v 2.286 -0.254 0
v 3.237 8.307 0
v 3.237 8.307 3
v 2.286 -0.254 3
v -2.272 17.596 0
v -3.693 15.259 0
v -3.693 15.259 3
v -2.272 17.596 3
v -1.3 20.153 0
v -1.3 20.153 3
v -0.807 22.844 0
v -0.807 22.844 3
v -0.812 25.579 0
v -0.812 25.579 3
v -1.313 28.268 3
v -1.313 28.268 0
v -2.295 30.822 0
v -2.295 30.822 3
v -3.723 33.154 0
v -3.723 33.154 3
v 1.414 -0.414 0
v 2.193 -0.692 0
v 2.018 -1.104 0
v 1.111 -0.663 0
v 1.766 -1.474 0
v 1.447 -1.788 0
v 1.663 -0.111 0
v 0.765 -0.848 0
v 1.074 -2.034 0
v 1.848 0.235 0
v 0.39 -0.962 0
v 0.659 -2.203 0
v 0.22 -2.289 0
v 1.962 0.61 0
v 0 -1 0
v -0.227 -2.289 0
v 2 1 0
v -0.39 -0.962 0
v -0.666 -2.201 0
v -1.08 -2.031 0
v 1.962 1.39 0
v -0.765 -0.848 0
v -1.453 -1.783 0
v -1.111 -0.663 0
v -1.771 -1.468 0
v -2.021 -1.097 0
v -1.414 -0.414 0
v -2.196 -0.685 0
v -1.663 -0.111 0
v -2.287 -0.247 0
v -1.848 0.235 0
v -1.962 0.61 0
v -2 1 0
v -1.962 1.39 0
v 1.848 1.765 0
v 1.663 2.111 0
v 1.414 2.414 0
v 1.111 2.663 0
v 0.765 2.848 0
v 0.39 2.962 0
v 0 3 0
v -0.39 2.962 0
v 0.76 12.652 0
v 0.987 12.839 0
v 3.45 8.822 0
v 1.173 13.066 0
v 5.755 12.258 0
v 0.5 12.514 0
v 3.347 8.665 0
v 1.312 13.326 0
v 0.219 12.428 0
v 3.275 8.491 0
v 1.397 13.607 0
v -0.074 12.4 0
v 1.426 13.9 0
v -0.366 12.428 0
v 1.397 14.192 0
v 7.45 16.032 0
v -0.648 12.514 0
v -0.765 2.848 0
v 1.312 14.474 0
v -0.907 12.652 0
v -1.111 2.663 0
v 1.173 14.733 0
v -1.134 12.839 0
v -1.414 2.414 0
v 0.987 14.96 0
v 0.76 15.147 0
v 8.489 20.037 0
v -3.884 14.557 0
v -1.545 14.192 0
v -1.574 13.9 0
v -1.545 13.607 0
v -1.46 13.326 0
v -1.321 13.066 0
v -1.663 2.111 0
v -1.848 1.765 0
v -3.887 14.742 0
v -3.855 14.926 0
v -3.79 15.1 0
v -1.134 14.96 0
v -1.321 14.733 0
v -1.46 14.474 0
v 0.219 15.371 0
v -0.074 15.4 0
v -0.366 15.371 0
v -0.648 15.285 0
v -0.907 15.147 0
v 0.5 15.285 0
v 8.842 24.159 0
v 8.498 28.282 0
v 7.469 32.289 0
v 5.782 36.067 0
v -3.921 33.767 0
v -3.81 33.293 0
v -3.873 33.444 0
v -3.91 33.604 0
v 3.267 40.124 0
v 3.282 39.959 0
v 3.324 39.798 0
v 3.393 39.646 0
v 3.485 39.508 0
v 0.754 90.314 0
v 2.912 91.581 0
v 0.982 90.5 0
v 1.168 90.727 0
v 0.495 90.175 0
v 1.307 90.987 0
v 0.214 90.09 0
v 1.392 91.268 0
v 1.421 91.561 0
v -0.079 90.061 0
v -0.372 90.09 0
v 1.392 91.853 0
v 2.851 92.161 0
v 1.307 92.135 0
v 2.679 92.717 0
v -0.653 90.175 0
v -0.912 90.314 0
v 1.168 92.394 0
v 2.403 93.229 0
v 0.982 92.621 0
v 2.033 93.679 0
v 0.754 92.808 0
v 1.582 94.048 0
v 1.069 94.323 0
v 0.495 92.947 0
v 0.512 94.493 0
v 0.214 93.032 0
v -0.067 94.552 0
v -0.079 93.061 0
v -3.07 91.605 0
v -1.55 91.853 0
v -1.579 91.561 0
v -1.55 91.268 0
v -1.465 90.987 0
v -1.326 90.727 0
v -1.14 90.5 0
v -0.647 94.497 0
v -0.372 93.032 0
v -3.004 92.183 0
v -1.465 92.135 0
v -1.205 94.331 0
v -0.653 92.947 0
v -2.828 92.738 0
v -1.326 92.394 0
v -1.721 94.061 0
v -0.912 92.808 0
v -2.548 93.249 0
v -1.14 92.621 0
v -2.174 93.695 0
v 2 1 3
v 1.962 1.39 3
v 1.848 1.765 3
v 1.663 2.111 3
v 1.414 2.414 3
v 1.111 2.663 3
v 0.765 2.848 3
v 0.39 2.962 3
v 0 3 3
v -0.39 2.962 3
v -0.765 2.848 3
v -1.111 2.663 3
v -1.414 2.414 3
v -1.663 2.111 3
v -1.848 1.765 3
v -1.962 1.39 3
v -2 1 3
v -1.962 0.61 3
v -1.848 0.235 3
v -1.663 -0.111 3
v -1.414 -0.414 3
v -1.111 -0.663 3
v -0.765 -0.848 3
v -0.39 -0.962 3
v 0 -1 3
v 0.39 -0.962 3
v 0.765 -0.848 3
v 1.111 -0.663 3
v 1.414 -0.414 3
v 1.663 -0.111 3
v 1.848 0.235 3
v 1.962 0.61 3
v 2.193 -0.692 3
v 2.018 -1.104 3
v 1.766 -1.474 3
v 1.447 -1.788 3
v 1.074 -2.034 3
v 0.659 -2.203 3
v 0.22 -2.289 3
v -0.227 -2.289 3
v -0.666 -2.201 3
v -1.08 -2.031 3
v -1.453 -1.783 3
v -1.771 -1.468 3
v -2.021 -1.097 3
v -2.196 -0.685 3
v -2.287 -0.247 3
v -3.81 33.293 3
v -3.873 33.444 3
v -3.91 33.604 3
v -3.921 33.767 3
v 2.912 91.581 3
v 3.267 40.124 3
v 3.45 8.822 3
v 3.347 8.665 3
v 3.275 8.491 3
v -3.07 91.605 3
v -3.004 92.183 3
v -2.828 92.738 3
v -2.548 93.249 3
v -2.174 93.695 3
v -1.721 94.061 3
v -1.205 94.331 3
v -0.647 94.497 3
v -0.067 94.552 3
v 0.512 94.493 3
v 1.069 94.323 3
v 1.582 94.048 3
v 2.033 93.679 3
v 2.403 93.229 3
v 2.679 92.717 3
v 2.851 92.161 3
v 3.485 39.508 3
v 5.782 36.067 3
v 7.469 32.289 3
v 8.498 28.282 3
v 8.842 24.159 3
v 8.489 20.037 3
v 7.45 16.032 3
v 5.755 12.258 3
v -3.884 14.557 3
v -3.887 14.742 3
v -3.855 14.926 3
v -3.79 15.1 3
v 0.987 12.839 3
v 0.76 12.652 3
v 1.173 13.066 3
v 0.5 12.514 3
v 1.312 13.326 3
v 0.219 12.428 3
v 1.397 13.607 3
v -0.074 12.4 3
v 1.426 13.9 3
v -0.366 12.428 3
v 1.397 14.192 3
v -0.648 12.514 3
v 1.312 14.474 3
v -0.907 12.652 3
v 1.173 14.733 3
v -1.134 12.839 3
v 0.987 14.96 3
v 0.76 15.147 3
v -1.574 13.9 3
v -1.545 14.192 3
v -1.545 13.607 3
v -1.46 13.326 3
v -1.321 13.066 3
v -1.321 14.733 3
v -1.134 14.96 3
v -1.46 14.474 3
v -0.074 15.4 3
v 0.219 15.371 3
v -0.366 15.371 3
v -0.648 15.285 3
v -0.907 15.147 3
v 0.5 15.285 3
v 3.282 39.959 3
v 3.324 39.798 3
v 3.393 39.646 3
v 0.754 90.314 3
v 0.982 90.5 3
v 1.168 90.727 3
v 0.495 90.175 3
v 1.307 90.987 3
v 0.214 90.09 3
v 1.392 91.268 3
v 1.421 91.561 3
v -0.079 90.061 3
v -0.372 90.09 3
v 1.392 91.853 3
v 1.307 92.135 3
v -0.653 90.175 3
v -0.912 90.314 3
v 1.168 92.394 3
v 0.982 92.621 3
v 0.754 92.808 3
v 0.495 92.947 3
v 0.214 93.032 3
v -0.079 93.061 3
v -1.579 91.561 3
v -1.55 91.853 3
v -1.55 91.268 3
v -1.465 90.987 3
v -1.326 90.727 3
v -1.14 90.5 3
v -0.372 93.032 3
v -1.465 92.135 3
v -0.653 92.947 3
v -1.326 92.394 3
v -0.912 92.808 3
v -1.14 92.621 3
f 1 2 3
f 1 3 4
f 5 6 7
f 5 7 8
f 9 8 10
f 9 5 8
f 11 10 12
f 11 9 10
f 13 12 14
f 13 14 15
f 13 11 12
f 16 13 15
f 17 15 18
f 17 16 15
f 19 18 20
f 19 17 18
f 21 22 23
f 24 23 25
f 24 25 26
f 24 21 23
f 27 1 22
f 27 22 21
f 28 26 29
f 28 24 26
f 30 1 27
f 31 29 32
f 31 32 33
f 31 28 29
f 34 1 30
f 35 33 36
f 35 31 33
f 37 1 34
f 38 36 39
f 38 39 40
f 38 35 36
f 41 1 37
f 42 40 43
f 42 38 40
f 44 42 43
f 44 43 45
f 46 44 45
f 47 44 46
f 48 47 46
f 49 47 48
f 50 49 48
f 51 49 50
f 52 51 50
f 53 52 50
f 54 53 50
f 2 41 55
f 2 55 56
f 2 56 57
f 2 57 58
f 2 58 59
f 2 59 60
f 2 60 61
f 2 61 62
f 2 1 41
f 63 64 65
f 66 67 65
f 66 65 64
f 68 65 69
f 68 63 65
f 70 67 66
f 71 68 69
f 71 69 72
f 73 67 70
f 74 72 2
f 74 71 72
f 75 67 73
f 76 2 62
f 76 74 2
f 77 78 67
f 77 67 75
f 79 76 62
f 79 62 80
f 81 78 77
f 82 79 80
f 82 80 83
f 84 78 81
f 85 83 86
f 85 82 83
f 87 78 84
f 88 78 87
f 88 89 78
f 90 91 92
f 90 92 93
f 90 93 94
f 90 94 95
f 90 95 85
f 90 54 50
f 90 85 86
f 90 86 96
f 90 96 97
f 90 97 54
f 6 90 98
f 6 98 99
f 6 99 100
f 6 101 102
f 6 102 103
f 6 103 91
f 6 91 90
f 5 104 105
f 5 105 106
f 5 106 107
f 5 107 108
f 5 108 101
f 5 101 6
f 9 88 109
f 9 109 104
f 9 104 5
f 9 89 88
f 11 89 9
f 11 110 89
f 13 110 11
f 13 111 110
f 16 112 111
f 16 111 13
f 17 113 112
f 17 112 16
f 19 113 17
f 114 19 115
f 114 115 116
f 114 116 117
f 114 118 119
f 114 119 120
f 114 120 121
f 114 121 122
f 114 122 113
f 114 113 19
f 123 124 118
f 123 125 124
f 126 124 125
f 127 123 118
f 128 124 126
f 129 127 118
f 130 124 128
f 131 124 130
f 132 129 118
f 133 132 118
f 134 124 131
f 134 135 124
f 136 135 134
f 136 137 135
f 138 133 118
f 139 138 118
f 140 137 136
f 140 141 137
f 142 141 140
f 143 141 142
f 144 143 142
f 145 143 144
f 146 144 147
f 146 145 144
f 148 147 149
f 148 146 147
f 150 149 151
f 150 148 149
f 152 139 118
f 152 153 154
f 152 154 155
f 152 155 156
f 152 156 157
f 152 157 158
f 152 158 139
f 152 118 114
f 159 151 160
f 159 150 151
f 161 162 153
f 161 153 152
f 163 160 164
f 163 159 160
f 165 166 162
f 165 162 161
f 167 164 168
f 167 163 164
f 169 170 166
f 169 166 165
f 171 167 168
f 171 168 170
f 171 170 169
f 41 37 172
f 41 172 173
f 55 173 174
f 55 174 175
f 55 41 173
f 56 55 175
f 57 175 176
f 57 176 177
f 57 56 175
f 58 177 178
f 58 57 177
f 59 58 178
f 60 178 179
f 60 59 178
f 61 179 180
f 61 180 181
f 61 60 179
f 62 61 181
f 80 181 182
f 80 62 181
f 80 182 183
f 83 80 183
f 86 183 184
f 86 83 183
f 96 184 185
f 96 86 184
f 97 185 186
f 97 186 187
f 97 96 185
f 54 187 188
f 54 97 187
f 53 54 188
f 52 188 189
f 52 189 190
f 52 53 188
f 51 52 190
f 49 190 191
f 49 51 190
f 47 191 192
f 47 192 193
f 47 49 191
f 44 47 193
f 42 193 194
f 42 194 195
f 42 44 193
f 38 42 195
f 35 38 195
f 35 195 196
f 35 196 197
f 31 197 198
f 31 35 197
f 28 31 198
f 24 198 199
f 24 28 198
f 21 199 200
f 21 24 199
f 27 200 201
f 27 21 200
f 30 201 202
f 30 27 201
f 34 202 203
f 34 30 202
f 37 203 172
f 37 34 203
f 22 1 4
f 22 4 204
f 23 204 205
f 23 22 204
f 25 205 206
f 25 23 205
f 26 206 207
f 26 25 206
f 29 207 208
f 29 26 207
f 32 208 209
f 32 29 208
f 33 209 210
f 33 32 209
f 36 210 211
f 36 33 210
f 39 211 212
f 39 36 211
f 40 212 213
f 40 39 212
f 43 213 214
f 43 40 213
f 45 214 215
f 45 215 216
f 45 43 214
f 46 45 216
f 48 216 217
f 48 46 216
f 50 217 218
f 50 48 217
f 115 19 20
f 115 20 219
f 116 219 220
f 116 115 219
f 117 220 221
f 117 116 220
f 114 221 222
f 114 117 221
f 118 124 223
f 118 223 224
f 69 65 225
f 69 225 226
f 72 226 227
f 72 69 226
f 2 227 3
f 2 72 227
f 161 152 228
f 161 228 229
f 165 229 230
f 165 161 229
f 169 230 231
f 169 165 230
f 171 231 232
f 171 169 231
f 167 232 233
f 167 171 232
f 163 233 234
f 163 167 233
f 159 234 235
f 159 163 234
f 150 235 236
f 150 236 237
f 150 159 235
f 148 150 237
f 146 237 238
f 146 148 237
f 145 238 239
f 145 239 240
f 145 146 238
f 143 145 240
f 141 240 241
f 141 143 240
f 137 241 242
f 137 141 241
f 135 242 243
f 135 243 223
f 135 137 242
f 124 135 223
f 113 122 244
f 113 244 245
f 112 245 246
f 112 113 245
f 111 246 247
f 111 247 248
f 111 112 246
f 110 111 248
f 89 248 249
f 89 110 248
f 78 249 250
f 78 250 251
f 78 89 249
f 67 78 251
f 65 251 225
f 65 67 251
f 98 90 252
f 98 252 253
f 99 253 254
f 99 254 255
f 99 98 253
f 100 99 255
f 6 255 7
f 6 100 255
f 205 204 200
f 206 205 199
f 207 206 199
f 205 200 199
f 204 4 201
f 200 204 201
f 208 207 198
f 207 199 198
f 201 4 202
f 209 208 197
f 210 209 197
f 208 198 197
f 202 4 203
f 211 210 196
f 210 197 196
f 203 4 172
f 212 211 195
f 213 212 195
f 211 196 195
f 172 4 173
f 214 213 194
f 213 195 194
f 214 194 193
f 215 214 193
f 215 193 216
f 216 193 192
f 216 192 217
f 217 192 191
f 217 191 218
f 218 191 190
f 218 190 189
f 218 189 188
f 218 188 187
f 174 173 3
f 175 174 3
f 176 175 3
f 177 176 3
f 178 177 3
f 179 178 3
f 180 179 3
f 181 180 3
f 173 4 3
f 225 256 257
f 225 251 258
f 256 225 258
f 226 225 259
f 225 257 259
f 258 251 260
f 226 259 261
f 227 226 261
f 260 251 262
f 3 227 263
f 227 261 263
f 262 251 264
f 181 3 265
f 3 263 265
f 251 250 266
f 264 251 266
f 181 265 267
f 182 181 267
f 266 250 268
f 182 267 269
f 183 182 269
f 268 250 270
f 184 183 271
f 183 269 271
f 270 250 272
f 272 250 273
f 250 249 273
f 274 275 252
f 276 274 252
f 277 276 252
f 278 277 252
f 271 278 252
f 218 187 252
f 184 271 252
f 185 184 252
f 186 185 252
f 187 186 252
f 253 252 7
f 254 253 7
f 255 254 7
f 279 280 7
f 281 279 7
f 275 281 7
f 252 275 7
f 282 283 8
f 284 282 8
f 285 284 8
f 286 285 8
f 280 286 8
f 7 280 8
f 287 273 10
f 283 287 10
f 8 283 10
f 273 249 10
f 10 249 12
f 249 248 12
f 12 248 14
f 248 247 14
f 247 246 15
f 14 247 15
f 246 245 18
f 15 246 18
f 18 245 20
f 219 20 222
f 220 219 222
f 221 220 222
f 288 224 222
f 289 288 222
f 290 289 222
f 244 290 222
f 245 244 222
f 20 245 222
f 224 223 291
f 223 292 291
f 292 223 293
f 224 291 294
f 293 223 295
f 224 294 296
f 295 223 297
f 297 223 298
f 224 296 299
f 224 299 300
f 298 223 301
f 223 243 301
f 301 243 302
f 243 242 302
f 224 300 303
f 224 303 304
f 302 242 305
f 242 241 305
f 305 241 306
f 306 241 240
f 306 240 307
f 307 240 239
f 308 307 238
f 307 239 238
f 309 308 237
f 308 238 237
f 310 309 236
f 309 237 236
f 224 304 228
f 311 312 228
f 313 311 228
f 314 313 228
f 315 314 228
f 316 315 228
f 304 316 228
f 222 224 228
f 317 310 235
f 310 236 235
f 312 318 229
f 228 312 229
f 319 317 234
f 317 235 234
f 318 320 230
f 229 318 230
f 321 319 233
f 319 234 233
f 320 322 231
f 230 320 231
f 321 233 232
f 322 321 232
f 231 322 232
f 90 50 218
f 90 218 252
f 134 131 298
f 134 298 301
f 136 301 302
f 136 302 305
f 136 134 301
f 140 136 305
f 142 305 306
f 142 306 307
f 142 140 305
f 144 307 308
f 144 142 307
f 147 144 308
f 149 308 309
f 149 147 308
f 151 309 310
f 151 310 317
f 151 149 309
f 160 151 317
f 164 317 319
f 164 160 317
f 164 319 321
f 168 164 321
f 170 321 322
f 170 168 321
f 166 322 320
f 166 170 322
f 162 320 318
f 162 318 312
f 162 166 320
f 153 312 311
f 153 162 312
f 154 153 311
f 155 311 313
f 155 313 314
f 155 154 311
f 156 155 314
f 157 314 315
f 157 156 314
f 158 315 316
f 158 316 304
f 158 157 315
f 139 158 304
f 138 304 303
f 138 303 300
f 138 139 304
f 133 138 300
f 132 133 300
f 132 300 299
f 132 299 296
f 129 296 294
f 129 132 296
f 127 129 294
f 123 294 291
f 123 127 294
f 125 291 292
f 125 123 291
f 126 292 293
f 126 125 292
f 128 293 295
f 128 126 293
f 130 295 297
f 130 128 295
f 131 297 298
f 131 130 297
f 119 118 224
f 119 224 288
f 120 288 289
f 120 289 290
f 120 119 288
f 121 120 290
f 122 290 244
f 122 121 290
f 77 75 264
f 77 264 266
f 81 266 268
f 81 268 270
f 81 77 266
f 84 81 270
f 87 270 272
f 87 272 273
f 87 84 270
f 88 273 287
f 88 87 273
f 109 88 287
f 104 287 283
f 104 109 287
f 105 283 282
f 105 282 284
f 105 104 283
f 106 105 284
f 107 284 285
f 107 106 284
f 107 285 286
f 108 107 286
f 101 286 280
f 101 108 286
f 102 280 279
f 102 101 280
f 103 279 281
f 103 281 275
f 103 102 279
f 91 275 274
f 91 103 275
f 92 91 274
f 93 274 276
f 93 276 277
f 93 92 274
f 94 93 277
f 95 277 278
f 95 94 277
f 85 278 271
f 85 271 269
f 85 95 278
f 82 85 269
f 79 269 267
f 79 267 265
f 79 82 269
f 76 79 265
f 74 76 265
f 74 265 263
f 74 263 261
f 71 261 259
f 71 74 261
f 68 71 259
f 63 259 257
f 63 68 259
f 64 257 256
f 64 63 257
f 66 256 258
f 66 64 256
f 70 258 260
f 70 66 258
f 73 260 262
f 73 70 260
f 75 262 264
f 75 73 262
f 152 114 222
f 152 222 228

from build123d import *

# Parameters (mm, degrees)
SKETCH_1_R      = 1.5
SKETCH_1_R_2    = 2
EXTRUDE_1_DEPTH = 3


with BuildPart() as part:
    # 草图1 → 凸台-拉伸1 (new body)
    with BuildSketch(Plane.XY):
        with BuildLine():
            Line((-2.286729251, -0.246717108), (-3.883861716, 14.556510567))
            ThreePointArc((-3.883861716, 14.556510567), (-3.854723084, 14.925691914), (-3.693228018, 15.258953478))
            ThreePointArc((-3.693228018, 15.258953478), (-0.747195178, 24.211667814), (-3.723167614, 33.154474505))
            ThreePointArc((-3.723167614, 33.154474505), (-3.872965508, 33.444371631), (-3.921458744, 33.767060581))
            Line((-3.921458744, 33.767060581), (-3.069651306, 91.604785634))
            ThreePointArc((-3.069651306, 91.604785634), (-0.067427131, 94.551575772), (2.911665375, 91.581402384))
            Line((2.911665375, 91.581402384), (3.267124799, 40.124176415))
            ThreePointArc((3.267124799, 40.124176415), (3.324280751, 39.797782311), (3.484958279, 39.507984717))
            ThreePointArc((3.484958279, 39.507984717), (8.841844113, 24.158825584), (3.450331122, 8.821795246))
            ThreePointArc((3.450331122, 8.821795246), (3.307226898, 8.579714374), (3.237181652, 8.307362338))
            Line((3.237181652, 8.307362338), (2.285932959, -0.25398919))
            ThreePointArc((2.285932959, -0.25398919), (-0.003657774, -2.299997091), (-2.286729251, -0.246717108))
        make_face()
        with Locations((-0.07911944, 91.560742455)):
            Circle(SKETCH_1_R, mode=Mode.SUBTRACT)
        with Locations((-0.073800571, 13.899599644)):
            Circle(SKETCH_1_R, mode=Mode.SUBTRACT)
        with Locations((0, 1)):
            Circle(SKETCH_1_R_2, mode=Mode.SUBTRACT)
    extrude(amount=EXTRUDE_1_DEPTH)


solid = part.part
